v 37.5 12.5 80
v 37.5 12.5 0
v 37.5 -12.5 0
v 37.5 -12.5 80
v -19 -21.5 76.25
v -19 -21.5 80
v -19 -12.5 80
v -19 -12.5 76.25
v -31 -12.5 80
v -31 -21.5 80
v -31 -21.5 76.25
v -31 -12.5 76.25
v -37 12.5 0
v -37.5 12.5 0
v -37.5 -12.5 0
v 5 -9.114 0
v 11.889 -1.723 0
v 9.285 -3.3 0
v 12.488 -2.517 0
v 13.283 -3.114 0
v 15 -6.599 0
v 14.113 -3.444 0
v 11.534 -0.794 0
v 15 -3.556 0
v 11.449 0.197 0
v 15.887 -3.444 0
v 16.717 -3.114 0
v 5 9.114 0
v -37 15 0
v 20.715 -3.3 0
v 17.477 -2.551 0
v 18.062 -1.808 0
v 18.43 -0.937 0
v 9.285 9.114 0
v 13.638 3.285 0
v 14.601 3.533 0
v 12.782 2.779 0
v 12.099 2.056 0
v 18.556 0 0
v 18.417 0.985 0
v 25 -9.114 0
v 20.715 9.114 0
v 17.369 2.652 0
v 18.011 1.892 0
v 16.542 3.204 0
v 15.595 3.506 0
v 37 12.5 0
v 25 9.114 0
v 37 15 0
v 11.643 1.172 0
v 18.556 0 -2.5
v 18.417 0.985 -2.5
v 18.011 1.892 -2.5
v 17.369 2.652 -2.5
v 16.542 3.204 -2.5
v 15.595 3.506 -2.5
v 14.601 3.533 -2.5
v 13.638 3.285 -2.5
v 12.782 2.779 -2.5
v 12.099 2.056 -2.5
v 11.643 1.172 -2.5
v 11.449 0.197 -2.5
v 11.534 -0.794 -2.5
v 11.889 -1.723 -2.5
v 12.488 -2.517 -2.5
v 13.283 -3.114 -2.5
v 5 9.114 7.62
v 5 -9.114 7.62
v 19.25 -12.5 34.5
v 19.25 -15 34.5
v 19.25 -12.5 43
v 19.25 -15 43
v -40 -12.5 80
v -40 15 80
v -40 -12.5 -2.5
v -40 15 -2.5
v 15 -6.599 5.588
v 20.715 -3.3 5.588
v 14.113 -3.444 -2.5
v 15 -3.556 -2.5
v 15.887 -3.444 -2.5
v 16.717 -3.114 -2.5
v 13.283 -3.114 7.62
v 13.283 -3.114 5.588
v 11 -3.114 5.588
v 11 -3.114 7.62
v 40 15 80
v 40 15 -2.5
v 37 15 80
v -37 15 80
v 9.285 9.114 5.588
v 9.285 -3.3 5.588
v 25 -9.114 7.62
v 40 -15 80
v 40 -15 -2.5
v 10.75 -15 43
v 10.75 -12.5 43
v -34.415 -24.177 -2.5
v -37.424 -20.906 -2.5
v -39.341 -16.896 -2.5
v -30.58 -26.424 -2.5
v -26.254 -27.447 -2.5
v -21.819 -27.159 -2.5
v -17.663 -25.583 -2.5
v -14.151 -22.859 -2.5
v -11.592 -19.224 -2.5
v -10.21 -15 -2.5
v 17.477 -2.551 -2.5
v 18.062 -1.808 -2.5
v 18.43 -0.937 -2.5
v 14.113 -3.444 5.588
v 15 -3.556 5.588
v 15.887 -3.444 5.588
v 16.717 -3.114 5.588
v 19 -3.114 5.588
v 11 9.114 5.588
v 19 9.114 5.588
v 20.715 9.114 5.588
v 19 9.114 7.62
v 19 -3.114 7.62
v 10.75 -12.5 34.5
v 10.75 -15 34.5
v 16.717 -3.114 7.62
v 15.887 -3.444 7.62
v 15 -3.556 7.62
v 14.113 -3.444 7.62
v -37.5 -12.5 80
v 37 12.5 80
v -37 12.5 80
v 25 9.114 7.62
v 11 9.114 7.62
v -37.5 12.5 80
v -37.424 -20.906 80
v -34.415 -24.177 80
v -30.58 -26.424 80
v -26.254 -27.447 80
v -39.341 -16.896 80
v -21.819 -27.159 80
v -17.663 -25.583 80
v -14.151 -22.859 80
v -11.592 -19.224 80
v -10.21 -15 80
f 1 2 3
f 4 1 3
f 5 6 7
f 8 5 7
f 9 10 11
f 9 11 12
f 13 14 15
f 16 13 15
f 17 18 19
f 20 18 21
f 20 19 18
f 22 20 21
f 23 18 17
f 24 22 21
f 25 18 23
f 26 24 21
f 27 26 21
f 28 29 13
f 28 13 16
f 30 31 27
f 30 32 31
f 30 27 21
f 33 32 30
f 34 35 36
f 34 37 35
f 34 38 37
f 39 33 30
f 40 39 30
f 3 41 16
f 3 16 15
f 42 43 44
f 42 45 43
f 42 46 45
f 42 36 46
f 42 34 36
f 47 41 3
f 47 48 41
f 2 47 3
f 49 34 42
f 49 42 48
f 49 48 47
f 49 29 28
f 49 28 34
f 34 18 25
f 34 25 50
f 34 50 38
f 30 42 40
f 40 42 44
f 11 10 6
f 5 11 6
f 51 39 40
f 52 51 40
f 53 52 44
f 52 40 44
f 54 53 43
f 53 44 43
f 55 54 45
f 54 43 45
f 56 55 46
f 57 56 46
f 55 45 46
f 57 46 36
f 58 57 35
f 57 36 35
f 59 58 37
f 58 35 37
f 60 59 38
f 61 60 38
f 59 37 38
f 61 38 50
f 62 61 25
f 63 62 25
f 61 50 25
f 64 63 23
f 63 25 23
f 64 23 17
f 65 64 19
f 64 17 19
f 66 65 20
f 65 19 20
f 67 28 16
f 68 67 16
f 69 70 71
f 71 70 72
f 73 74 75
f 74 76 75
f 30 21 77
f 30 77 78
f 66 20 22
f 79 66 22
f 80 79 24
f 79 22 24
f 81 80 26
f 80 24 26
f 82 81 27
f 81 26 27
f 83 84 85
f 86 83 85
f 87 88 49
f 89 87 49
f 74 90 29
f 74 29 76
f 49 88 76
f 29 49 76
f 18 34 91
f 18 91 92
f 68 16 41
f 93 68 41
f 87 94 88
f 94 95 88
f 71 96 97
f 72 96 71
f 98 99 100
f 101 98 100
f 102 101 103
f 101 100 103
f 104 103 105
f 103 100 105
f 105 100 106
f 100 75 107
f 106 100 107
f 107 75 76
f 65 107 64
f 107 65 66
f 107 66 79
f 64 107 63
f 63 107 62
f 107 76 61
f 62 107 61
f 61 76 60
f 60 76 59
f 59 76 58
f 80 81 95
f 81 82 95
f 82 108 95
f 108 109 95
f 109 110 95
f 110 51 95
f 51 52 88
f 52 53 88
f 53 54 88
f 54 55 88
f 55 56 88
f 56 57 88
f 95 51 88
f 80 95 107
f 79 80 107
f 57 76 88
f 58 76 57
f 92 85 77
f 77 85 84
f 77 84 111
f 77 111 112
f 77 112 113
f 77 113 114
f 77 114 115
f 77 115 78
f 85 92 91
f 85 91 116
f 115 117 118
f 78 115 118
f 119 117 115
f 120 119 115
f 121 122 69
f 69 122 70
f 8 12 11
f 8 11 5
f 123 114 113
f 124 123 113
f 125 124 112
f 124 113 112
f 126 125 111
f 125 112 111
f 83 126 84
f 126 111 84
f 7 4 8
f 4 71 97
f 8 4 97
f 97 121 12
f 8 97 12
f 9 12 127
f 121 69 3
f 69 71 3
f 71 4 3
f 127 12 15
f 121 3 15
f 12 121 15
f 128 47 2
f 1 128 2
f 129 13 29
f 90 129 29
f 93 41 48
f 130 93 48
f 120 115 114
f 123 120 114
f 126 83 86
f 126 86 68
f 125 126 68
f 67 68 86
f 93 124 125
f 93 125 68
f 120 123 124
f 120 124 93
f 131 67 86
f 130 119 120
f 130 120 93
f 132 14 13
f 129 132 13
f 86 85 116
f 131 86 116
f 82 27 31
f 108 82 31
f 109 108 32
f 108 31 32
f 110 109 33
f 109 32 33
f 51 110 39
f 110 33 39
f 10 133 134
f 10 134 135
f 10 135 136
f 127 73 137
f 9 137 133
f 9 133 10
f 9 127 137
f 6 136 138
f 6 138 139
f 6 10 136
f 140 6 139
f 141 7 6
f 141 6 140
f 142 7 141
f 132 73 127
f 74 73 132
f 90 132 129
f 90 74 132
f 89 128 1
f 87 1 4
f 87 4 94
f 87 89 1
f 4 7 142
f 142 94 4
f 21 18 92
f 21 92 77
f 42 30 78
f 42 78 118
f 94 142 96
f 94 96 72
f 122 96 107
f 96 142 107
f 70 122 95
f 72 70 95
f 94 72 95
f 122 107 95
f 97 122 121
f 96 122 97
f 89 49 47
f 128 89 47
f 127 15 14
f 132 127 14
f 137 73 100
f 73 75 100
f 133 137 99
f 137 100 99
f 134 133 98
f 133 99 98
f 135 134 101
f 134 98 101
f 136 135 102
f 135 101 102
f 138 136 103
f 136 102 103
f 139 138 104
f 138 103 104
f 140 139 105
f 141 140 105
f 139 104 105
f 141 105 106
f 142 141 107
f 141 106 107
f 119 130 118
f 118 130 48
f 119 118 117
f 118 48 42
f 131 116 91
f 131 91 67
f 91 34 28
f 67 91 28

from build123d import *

# Parameters (mm, degrees)
F1_W      = 74
F1_H      = 2.5
F2_DEPTH  = 2.5
F3_DEPTH  = 80
F4_W      = 12
F4_H      = 12
F5_DEPTH  = 3.75
F6_W      = 8.5
F6_H      = 8.5
F7_DEPTH  = 2.5
F9_DEPTH  = 2.5
F10_DEPTH = 7.62
F11_DEPTH = 5.588


with BuildPart() as f2:
    # F1 (on Top) → F2 (new body)
    with BuildSketch(Plane.XY):
        Polygon((37.5, -12.5), (37.5, 12.5), (37, 12.5), (-37, 12.5), (-37.5, 12.5), (-37.5, -12.5), (-12.5, -12.5), align=None)
        with BuildLine():
            Line((37, 12.5), (37.5, 12.5))
            Line((37.5, 12.5), (37.5, -12.5))
            Line((37.5, -12.5), (-12.5, -12.5))
            ThreePointArc((-12.5, -12.5), (-25, -25), (-37.5, -12.5))
            Line((-37.5, -12.5), (-37.5, 12.5))
            Line((-37.5, 12.5), (-37, 12.5))
            Line((-37, 12.5), (-37, 15))
            Line((-37, 15), (-40, 15))
            Line((-40, 15), (-40, -12.5))
            ThreePointArc((-40, -12.5), (-26.2543939042, -27.4474578418), (-10.2098005423, -15))
            Line((-10.2098005423, -15), (40, -15))
            Line((40, -15), (40, 15))
            Line((40, 15), (37, 15))
            Line((37, 15), (37, 12.5))
        make_face()
        with Locations((0, 13.75)):
            Rectangle(F1_W, F1_H)
        with BuildLine():
            ThreePointArc((-37.5, -12.5), (-25, -25), (-12.5, -12.5))
            Line((-12.5, -12.5), (-37.5, -12.5))
        make_face()
    extrude(amount=-F2_DEPTH)

    # F1 (on Top) → F3 (join)
    with BuildSketch(Plane.XY):
        with BuildLine():
            Line((37, 12.5), (37.5, 12.5))
            Line((37.5, 12.5), (37.5, -12.5))
            Line((37.5, -12.5), (-12.5, -12.5))
            ThreePointArc((-12.5, -12.5), (-25, -25), (-37.5, -12.5))
            Line((-37.5, -12.5), (-37.5, 12.5))
            Line((-37.5, 12.5), (-37, 12.5))
            Line((-37, 12.5), (-37, 15))
            Line((-37, 15), (-40, 15))
            Line((-40, 15), (-40, -12.5))
            ThreePointArc((-40, -12.5), (-26.2543939042, -27.4474578418), (-10.2098005423, -15))
            Line((-10.2098005423, -15), (40, -15))
            Line((40, -15), (40, 15))
            Line((40, 15), (37, 15))
            Line((37, 15), (37, 12.5))
        make_face()
        with BuildLine():
            ThreePointArc((-37.5, -12.5), (-25, -25), (-12.5, -12.5))
            Line((-12.5, -12.5), (-37.5, -12.5))
        make_face()
    extrude(amount=F3_DEPTH)

    # F4 (on face) → F5 (cut)
    with BuildSketch(Plane.XY.offset(80)):
        with Locations((-25, -15.5)):
            Rectangle(F4_W, F4_H)
    extrude(amount=-F5_DEPTH, mode=Mode.SUBTRACT)

    # F6 (on face) → F7 (cut, through all)
    with BuildSketch(Plane.XZ.offset(15)):
        with Locations((15, 38.75)):
            Rectangle(F6_W, F6_H)
    extrude(amount=-F7_DEPTH, mode=Mode.SUBTRACT)

    # F8 (on face) → F9 (cut, through all)
    with BuildSketch(Plane.XY):
        with BuildLine():
            Line((16.717254696, -3.1138677411), (13.282745304, -3.1138677411))
            ThreePointArc((13.282745304, -3.1138677411), (15, -3.556), (16.717254696, -3.1138677411))
        make_face()
        with BuildLine():
            ThreePointArc((18.556, 0), (13.191882429, 3.0620004653), (13.282745304, -3.1138677411))
            Line((13.282745304, -3.1138677411), (16.717254696, -3.1138677411))
            ThreePointArc((16.717254696, -3.1138677411), (18.0620004653, -1.808117571), (18.556, 0))
        make_face()
    extrude(amount=-F9_DEPTH, mode=Mode.SUBTRACT)

    # F8 (on face) → F10 (join)
    with BuildSketch(Plane.XY):
        Polygon((15, -6.5991135768), (9.285, -3.2995567884), (9.285, 3.2995567884), (9.285, 9.1138677411), (5, 9.1138677411), (5, -9.1138677411), (25, -9.1138677411), (25, 9.1138677411), (20.715, 9.1138677411), (20.715, 3.2995567884), (20.715, -3.2995567884), align=None)
        Polygon((19, 4.2897125001), (20.715, 3.2995567884), (20.715, 9.1138677411), (19, 9.1138677411), align=None)
        with BuildLine():
            Line((9.285, 3.2995567884), (9.285, -3.2995567884))
            Line((9.285, -3.2995567884), (15, -6.5991135768))
            Line((15, -6.5991135768), (20.715, -3.2995567884))
            Line((20.715, -3.2995567884), (20.715, 3.2995567884))
            Line((20.715, 3.2995567884), (19, 4.2897125001))
            Line((19, 4.2897125001), (19, 3.1138677411))
            Line((19, 3.1138677411), (19, -3.1138677411))
            Line((19, -3.1138677411), (16.717254696, -3.1138677411))
            ThreePointArc((16.717254696, -3.1138677411), (15, -3.556), (13.282745304, -3.1138677411))
            Line((13.282745304, -3.1138677411), (11, -3.1138677411))
            Line((11, -3.1138677411), (11, 3.1138677411))
            Line((11, 3.1138677411), (11, 4.2897125001))
            Line((11, 4.2897125001), (9.285, 3.2995567884))
        make_face()
        Polygon((9.285, 9.1138677411), (9.285, 3.2995567884), (11, 4.2897125001), (11, 9.1138677411), align=None)
    extrude(amount=F10_DEPTH)

    # F8 (on face) → F11 (cut)
    with BuildSketch(Plane.XY):
        with BuildLine():
            Line((9.285, 3.2995567884), (9.285, -3.2995567884))
            Line((9.285, -3.2995567884), (15, -6.5991135768))
            Line((15, -6.5991135768), (20.715, -3.2995567884))
            Line((20.715, -3.2995567884), (20.715, 3.2995567884))
            Line((20.715, 3.2995567884), (19, 4.2897125001))
            Line((19, 4.2897125001), (19, 3.1138677411))
            Line((19, 3.1138677411), (19, -3.1138677411))
            Line((19, -3.1138677411), (16.717254696, -3.1138677411))
            ThreePointArc((16.717254696, -3.1138677411), (15, -3.556), (13.282745304, -3.1138677411))
            Line((13.282745304, -3.1138677411), (11, -3.1138677411))
            Line((11, -3.1138677411), (11, 3.1138677411))
            Line((11, 3.1138677411), (11, 4.2897125001))
            Line((11, 4.2897125001), (9.285, 3.2995567884))
        make_face()
        Polygon((19, 4.2897125001), (20.715, 3.2995567884), (20.715, 9.1138677411), (19, 9.1138677411), align=None)
        Polygon((9.285, 9.1138677411), (9.285, 3.2995567884), (11, 4.2897125001), (11, 9.1138677411), align=None)
    extrude(amount=F11_DEPTH, mode=Mode.SUBTRACT)


solid = f2.part
